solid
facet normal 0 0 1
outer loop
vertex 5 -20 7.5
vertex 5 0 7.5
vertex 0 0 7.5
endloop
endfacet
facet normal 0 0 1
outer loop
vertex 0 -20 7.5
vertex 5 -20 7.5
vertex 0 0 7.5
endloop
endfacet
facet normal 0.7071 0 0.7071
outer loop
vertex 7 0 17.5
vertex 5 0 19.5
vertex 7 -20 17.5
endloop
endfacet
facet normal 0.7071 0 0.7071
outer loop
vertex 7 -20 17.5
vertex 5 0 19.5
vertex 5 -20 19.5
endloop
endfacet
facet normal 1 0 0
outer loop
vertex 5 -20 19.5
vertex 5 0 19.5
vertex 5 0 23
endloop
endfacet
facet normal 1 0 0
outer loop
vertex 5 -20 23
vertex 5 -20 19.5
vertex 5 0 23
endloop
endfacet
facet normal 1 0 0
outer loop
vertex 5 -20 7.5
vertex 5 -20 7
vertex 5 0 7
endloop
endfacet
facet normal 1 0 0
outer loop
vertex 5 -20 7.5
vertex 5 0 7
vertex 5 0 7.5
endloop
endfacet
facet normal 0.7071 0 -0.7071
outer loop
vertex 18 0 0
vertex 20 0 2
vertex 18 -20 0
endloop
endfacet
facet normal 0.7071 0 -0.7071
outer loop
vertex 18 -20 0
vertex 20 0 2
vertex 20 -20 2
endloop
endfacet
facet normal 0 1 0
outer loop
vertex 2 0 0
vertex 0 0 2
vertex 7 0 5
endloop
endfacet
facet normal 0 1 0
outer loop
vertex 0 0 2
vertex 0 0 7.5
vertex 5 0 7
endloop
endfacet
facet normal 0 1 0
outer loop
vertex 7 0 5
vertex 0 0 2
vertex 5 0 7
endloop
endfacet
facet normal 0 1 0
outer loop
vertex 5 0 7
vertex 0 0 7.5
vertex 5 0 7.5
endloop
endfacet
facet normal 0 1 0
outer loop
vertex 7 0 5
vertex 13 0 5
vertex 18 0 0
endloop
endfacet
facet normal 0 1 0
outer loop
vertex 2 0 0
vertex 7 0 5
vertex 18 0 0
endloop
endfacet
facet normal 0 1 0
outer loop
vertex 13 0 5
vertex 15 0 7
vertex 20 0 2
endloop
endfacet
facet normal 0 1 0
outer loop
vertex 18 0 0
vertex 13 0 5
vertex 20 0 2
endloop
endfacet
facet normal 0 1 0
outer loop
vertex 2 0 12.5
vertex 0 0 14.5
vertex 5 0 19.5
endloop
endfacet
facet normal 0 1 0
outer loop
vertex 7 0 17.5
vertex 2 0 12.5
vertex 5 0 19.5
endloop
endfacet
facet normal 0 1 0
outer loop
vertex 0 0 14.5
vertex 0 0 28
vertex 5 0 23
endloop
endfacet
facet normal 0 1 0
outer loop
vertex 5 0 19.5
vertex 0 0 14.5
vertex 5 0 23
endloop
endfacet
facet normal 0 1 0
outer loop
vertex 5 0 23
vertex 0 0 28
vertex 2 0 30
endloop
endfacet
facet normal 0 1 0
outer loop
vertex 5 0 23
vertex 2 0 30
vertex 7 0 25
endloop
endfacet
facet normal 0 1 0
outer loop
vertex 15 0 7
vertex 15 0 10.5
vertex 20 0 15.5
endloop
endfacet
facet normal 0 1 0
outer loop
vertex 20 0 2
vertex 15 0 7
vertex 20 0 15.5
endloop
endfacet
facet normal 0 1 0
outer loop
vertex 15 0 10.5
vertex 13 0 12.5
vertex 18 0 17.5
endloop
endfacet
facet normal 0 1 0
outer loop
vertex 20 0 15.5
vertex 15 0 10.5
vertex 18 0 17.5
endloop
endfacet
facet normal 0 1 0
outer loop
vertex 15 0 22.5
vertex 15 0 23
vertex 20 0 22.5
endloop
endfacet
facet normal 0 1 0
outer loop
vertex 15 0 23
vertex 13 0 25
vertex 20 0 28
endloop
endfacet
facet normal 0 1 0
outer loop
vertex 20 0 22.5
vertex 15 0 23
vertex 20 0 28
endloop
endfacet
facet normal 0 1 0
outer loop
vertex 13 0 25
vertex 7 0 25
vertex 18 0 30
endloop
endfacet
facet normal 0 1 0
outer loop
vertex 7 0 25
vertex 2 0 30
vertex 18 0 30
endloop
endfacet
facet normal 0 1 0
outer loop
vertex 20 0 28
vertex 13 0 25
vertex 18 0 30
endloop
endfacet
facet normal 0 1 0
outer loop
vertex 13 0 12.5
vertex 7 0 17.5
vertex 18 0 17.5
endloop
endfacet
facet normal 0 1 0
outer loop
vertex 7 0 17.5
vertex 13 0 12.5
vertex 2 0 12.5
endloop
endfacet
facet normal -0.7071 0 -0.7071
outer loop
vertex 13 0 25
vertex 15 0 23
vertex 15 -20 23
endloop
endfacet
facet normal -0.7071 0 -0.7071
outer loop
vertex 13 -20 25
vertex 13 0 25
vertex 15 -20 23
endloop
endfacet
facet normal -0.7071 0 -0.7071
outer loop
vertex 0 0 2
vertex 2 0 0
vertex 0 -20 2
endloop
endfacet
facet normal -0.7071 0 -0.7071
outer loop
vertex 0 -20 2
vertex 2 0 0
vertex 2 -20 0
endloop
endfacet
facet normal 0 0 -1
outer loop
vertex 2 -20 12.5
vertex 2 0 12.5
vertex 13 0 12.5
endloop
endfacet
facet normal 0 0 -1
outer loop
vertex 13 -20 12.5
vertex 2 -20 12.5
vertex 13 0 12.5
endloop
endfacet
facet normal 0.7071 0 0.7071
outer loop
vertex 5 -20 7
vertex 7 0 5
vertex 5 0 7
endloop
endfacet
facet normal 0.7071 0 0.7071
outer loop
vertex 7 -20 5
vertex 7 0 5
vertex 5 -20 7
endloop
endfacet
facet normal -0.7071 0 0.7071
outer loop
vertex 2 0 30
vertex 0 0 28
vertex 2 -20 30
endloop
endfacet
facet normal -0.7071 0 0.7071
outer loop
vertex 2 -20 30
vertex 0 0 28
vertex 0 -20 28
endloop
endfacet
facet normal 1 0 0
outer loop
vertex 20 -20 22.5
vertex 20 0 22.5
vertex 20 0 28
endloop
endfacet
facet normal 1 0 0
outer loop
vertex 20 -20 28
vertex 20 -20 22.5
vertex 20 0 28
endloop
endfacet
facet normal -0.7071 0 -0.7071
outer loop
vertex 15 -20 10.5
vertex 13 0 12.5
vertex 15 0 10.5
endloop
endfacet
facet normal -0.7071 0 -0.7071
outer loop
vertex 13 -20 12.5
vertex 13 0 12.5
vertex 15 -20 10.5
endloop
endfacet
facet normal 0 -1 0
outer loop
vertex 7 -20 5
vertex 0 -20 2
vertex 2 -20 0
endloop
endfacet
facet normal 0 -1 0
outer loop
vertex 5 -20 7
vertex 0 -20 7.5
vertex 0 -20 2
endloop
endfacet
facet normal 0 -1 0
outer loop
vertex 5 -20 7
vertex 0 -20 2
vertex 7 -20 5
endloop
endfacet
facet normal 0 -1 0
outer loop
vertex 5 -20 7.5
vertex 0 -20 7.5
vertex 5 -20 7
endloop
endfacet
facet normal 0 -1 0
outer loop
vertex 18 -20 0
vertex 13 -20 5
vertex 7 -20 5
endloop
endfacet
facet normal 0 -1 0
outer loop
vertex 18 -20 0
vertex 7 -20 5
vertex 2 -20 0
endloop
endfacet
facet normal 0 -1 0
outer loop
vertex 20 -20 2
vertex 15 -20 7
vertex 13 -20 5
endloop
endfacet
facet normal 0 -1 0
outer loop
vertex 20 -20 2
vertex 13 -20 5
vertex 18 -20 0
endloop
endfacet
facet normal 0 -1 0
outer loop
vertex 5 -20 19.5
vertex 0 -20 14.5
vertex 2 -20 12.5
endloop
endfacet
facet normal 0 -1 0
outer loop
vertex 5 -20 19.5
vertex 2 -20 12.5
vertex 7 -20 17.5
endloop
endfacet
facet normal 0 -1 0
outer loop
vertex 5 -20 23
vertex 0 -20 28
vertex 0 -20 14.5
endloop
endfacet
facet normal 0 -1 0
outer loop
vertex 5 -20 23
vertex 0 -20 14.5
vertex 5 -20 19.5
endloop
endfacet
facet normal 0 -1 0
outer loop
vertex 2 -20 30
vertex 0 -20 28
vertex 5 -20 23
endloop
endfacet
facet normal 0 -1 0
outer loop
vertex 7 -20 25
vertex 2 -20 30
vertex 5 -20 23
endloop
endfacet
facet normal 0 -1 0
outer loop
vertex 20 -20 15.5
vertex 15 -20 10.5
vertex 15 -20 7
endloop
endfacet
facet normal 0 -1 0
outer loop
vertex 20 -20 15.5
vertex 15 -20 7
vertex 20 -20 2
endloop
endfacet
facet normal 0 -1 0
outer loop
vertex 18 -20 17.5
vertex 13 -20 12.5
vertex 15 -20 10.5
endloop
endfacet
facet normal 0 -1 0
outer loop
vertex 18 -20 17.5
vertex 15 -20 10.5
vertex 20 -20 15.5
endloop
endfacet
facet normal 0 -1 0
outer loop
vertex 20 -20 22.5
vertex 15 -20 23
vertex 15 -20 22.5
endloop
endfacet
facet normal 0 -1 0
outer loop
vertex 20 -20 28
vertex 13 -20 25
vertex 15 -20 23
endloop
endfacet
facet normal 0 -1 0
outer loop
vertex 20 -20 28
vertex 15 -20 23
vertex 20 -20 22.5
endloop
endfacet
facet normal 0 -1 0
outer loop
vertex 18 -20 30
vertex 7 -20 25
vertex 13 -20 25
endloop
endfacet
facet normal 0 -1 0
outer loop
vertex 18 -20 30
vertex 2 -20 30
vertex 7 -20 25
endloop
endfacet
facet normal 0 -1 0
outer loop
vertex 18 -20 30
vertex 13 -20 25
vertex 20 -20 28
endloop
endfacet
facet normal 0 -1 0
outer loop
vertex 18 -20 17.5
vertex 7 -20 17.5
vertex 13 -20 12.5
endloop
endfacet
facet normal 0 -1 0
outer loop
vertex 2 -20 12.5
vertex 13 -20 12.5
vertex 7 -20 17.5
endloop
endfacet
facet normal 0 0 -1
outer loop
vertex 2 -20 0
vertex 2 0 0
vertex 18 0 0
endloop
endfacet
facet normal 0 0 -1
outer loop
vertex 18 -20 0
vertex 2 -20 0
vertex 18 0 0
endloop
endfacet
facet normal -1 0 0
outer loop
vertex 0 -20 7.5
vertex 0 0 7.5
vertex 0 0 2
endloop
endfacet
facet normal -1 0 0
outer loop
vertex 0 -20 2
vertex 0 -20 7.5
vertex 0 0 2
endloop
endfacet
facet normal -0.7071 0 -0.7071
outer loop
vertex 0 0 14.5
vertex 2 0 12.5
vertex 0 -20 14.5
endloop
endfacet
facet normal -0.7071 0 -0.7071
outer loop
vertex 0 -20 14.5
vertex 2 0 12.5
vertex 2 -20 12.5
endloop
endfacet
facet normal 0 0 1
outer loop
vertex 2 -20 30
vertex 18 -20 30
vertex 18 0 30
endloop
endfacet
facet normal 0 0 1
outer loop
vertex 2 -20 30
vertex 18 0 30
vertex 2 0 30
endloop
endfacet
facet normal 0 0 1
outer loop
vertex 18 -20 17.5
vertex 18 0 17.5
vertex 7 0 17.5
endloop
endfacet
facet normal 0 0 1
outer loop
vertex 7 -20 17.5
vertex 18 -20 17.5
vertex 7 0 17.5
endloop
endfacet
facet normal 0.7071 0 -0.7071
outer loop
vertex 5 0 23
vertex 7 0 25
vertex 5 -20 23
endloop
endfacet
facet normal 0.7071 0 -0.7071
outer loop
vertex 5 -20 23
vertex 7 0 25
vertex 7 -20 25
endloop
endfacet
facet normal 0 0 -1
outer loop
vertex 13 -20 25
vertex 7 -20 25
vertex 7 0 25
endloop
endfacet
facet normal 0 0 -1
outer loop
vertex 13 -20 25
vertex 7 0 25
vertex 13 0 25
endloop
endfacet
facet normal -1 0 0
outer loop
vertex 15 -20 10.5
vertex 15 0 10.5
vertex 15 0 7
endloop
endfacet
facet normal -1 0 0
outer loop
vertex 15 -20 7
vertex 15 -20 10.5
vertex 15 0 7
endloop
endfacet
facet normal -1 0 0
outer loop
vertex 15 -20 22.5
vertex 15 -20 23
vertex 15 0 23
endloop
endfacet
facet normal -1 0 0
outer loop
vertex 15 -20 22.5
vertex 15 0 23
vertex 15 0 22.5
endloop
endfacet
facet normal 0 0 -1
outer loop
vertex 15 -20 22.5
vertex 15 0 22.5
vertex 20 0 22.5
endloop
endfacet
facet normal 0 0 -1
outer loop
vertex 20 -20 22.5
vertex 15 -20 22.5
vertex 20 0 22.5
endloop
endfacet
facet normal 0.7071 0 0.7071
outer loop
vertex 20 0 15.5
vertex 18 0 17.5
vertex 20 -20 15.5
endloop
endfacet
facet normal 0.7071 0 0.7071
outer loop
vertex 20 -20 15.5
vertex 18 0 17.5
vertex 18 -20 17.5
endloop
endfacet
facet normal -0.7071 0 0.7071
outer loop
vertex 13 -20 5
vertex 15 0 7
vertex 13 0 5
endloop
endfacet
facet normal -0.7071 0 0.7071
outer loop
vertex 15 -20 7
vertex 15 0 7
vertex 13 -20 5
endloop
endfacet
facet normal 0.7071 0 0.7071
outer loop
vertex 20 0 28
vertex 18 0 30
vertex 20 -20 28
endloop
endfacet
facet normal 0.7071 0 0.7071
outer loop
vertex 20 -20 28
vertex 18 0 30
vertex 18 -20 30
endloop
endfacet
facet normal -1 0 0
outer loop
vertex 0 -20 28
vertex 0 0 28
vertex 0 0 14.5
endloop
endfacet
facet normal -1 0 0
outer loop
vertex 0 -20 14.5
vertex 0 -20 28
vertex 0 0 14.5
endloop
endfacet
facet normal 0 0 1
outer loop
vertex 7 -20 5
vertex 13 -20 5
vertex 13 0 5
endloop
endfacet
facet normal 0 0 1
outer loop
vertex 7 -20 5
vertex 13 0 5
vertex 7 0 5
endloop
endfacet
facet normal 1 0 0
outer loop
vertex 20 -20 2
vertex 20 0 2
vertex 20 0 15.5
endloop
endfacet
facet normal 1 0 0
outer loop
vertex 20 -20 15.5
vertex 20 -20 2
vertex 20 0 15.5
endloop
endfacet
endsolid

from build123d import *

# Parameters (mm, degrees)
F1_DEPTH = 20
F2_SIZE  = 2
F3_SIZE  = 2


with BuildPart() as f1:
    # F0 (on Front) → F1 (new body)
    with BuildSketch(Plane.XZ):
        Polygon((0, 7.5), (0, 0), (20, 0), (20, 17.5), (5, 17.5), (5, 25), (15, 25), (15, 22.5), (20, 22.5), (20, 30), (0, 30), (0, 12.5), (15, 12.5), (15, 5), (5, 5), (5, 7.5), align=None)
    extrude(amount=F1_DEPTH)

    # F2
    f2_edges = [f1.edges().sort_by_distance(p)[0] for p in [
        (20, -10, 30),
        (0, -10, 30),
        (0, -10, 12.5),
        (20, -10, 17.5),
        (0, -10, 0),
        (20, -10, 0),
    ]]
    chamfer(f2_edges, length=F2_SIZE)

    # F3
    f3_edges = [f1.edges().sort_by_distance(p)[0] for p in [
        (5, -10, 17.5),
        (5, -10, 5),
        (5, -10, 25),
        (15, -10, 12.5),
        (15, -10, 25),
        (15, -10, 5),
    ]]
    chamfer(f3_edges, length=F3_SIZE)


solid = f1.part
